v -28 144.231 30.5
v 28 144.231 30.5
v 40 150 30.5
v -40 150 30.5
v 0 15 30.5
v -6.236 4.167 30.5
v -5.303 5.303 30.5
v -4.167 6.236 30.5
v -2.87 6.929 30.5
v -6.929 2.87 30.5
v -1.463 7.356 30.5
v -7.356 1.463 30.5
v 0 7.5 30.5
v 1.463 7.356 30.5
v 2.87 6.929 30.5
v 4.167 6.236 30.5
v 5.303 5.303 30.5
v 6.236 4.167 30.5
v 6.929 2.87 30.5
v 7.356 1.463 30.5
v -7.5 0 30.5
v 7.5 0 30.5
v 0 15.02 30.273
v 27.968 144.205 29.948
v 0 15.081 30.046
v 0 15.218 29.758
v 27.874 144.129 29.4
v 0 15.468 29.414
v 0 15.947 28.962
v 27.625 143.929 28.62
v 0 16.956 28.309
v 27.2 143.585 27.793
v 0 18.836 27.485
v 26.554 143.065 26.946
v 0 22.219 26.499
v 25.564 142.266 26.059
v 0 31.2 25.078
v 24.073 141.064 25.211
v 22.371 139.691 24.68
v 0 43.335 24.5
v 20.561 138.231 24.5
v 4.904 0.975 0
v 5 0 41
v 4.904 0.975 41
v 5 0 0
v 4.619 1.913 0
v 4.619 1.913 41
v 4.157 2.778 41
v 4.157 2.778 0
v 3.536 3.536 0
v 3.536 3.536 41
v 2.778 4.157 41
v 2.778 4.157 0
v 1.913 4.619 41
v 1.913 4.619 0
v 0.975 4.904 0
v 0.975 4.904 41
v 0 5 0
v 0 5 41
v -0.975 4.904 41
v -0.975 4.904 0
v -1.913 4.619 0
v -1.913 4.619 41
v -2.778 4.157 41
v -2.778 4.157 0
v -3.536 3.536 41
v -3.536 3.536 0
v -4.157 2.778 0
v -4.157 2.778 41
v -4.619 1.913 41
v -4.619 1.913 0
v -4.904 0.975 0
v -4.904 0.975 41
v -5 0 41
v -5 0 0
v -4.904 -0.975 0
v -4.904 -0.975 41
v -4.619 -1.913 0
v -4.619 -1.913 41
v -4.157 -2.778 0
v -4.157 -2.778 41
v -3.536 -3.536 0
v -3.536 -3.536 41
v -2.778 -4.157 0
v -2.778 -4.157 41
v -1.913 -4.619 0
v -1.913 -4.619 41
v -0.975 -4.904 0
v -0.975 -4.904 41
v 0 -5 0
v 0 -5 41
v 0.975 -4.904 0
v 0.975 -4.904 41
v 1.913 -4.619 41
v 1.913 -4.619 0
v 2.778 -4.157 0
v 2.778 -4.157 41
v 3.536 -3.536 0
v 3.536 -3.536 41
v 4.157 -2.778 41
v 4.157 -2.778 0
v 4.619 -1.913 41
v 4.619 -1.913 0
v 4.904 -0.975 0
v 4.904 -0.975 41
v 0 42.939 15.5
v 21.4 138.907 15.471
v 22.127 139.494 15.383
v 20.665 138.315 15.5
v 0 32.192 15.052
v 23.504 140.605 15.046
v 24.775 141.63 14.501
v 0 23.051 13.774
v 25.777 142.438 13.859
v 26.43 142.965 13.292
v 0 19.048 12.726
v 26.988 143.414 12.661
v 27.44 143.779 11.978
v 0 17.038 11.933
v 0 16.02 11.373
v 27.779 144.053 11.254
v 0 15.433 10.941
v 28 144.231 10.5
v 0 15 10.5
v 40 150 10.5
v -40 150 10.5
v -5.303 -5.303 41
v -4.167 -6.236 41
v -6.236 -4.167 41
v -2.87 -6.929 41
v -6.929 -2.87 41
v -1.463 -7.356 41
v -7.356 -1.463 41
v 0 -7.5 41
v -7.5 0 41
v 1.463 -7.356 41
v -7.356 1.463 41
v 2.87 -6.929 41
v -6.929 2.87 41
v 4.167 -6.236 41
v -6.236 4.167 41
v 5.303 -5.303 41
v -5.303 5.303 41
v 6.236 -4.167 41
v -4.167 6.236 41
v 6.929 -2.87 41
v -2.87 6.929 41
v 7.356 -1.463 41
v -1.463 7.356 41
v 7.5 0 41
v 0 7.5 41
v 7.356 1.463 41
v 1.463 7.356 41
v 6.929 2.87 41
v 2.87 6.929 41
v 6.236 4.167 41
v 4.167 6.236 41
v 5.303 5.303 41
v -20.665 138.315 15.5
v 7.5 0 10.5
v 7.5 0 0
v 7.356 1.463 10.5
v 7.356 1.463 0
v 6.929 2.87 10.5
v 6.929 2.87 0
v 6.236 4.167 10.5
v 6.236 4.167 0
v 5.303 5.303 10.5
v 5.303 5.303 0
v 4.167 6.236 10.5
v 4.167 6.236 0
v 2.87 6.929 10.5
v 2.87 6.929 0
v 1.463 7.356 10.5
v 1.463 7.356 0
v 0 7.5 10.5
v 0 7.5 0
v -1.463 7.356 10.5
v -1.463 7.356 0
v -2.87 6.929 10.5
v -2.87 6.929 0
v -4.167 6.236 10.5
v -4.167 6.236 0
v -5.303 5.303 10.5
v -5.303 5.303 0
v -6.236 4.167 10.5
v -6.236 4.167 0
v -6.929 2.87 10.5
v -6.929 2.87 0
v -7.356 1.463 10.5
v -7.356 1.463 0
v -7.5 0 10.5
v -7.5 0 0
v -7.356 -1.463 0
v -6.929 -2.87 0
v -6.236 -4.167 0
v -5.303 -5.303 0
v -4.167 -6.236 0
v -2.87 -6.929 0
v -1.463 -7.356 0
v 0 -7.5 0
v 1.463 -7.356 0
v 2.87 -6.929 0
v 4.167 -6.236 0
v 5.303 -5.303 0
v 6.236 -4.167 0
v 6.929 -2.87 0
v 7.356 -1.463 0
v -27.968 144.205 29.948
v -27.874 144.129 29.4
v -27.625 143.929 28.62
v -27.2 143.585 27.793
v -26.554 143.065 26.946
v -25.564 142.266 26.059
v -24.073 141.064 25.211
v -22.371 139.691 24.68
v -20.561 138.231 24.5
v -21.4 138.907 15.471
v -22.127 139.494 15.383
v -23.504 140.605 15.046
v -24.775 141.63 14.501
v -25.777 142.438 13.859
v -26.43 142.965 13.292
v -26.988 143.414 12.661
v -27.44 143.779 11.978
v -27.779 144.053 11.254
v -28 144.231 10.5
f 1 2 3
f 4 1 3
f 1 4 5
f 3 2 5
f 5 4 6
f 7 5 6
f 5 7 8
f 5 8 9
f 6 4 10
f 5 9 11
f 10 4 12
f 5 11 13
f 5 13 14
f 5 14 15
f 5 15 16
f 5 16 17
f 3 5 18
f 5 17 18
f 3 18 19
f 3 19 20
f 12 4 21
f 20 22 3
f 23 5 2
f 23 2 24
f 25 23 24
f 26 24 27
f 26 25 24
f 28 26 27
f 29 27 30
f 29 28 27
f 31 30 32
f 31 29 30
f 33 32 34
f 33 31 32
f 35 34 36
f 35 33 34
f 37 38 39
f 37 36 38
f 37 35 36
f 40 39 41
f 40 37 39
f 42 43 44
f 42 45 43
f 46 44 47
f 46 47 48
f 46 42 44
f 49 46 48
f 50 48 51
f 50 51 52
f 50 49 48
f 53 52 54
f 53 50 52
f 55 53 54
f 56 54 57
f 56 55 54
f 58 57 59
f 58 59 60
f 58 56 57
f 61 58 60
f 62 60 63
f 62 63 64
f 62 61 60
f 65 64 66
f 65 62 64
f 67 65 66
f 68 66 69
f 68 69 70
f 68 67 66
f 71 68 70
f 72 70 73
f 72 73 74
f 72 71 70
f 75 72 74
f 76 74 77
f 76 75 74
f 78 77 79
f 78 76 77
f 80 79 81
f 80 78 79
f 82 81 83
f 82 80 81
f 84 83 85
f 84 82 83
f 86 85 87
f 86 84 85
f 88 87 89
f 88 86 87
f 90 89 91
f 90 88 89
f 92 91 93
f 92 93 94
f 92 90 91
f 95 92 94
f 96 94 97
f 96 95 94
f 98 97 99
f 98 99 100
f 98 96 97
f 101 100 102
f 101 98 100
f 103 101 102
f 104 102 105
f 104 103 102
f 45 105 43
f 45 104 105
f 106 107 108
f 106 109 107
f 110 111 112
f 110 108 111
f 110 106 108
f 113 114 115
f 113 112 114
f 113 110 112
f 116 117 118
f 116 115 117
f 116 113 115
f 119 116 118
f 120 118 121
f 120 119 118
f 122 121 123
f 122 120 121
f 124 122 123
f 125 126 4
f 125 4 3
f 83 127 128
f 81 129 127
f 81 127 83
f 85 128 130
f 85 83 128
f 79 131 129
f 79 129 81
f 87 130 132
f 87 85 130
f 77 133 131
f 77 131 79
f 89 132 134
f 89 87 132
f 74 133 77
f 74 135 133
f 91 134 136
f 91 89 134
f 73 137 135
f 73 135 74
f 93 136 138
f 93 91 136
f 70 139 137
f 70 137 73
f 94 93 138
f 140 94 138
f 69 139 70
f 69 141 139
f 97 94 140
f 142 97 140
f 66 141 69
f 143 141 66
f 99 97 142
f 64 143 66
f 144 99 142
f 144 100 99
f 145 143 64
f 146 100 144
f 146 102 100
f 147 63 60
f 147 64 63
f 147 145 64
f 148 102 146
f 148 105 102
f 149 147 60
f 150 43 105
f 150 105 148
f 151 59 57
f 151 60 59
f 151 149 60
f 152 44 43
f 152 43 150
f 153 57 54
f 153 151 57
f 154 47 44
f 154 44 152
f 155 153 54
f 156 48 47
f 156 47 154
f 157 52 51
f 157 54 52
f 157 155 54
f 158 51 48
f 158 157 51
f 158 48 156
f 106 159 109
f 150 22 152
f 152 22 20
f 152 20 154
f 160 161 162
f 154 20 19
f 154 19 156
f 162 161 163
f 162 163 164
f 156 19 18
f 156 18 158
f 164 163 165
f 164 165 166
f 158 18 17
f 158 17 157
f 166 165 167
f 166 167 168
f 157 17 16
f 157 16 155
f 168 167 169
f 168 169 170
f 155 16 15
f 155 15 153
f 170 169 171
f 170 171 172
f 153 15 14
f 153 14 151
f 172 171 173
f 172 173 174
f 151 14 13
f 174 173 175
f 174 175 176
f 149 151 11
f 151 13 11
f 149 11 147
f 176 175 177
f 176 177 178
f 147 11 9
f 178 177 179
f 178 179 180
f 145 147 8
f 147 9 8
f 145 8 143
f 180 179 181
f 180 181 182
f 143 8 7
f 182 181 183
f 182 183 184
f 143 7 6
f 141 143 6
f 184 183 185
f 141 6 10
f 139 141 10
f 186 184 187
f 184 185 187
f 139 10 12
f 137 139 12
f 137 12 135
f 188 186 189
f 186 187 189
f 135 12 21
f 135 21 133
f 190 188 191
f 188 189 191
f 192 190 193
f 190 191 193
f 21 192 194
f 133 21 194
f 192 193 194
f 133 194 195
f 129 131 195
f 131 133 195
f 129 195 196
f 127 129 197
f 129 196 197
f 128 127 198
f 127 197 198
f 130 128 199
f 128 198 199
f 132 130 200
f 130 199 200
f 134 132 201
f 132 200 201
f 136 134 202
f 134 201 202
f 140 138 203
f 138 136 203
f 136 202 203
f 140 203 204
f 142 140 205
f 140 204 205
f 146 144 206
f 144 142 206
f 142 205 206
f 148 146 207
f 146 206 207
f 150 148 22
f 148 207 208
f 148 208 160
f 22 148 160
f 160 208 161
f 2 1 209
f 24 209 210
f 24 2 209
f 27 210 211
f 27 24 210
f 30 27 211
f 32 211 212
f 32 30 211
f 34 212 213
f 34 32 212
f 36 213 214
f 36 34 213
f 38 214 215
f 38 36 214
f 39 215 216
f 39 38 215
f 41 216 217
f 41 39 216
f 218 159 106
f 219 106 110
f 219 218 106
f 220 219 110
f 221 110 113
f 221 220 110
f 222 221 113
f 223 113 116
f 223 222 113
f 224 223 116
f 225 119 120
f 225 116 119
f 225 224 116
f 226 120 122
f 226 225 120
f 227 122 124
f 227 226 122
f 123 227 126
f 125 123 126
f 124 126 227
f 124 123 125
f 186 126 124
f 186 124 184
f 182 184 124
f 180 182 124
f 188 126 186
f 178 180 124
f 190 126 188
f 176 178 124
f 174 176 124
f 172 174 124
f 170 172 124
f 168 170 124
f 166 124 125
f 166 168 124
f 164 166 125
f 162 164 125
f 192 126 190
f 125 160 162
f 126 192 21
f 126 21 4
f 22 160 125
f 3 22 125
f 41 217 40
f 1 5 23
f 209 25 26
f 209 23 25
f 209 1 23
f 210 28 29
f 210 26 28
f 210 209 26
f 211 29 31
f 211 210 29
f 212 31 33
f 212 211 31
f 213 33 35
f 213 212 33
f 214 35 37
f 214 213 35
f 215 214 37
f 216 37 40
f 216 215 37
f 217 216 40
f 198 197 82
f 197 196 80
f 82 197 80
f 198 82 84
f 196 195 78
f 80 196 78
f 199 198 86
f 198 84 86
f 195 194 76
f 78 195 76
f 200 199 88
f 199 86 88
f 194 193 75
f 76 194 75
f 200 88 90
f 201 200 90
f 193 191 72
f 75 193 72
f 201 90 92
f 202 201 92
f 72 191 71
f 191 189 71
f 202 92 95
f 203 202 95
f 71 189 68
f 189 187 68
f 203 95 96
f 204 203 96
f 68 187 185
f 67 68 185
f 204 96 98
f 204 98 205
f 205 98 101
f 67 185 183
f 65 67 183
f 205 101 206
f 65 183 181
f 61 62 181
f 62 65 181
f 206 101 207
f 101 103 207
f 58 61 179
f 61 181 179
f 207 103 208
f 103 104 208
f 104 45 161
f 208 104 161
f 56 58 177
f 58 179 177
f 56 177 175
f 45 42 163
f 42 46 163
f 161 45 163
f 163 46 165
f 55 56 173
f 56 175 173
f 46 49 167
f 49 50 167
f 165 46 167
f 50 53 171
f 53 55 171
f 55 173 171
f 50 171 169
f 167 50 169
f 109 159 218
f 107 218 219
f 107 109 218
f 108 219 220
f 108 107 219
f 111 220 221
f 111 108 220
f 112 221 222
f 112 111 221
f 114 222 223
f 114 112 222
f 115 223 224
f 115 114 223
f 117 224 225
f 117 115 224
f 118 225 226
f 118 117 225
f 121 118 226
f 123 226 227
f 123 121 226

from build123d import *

# Parameters (mm, degrees)
SKETCH1_R           = 7.5
SKETCH1_R_2         = 5
BOSS_EXTRUDE1_DEPTH = 41
SKETCH2_W           = 80
SKETCH2_H           = 20
BOSS_EXTRUDE2_DEPTH = 150
SKETCH3_R           = 5
CUT_EXTRUDE1_DEPTH  = 150
CUT_EXTRUDE2_DEPTH  = 150
CUT_EXTRUDE3_DEPTH  = 6
FILLET1_R           = 6


with BuildPart() as part:
    # Sketch1 → Boss-Extrude1 (new body)
    with BuildSketch(Plane.XY):
        Circle(SKETCH1_R)
        Circle(SKETCH1_R_2, mode=Mode.SUBTRACT)
    extrude(amount=BOSS_EXTRUDE1_DEPTH)

    # Sketch2 → Boss-Extrude2 (add)
    with BuildSketch(Plane(origin=(0, 0, 0), x_dir=(1, 0, 0), z_dir=(0, 1, 0))):
        with Locations((0, -20.5)):
            Rectangle(SKETCH2_W, SKETCH2_H)
    extrude(amount=BOSS_EXTRUDE2_DEPTH)

    # Sketch3 → Cut-Extrude1 (cut)
    with BuildSketch(Plane(origin=(0, 0, 0), x_dir=(-1, 0, 0), z_dir=(0, 0, -1))):
        with Locations(Location((0, 0, 0), (0, 0, 180))):
            Circle(SKETCH3_R)
    extrude(amount=-CUT_EXTRUDE1_DEPTH, mode=Mode.SUBTRACT)

    # Sketch4 → Cut-Extrude2 (cut)
    with BuildSketch(Plane(origin=(0, 0, 10.5), x_dir=(-1, 0, 0), z_dir=(0, 0, -1))):
        Polygon((7.5, 0), (40, 150), (40, 0), align=None)
    cut_extrude2 = extrude(amount=-CUT_EXTRUDE2_DEPTH, mode=Mode.SUBTRACT)

    # Mirror1: Cut-Extrude2 across plane
    add(cut_extrude2.mirror(Plane(origin=(0, 0, 0), x_dir=(0, 0, 1), z_dir=(1, 0, 0))), mode=Mode.SUBTRACT)

    # Sketch5 → Cut-Extrude3 (cut)
    with BuildSketch(Plane.XY.offset(30.5)):
        Polygon((-28, 144.230769231), (0, 15), (28, 144.230769231), align=None)
    cut_extrude3 = extrude(amount=-CUT_EXTRUDE3_DEPTH, mode=Mode.SUBTRACT)

    # Mirror2: Cut-Extrude3 across plane
    add(cut_extrude3.mirror(Plane.XY.offset(20)), mode=Mode.SUBTRACT)

    # Fillet1
    # the kernel refuses this fillet: 6 mm, written as the material it adds along each edge
    with BuildSketch(Plane(origin=(-3.176300205, 0.3401529, 24.5), x_dir=(0, 0, 1), z_dir=(0.21175334700580606, 0.9773231400267973, 0))) as fillet1_piece_1_section:
        with BuildLine():
            CenterArc((FILLET1_R, -FILLET1_R), FILLET1_R, 90, 90)
            Line((0, -FILLET1_R), (0, 0))
            Line((0, 0), (FILLET1_R, 0))
        make_face()
    fillet1_piece_1 = extrude(amount=162.229314889, mode=Mode.PRIVATE)
    fillet1_piece_1 = split(fillet1_piece_1, bisect_by=Plane(origin=(-13.111456884, 75.514416388, 25.854154081), z_dir=(0.9773231400267973, 0.21175334700580611, 0)), keep=Keep.TOP, mode=Mode.PRIVATE)
    fillet1_piece_1 = split(fillet1_piece_1, bisect_by=Plane(origin=(12.989714393, 144.230769231, 25.854154081), z_dir=(0, -1, 0)), keep=Keep.TOP, mode=Mode.PRIVATE)
    add(fillet1_piece_1)
    with BuildSketch(Plane(origin=(-31.176300205, 158.890616331, 24.5), x_dir=(0, 0, 1), z_dir=(0.21175334700580611, -0.9773231400267973, 0))) as fillet1_piece_2_section:
        with BuildLine():
            CenterArc((FILLET1_R, -FILLET1_R), FILLET1_R, 90, 90)
            Line((0, -FILLET1_R), (0, 0))
            Line((0, 0), (FILLET1_R, 0))
        make_face()
    fillet1_piece_2 = extrude(amount=162.229314889, mode=Mode.PRIVATE)
    fillet1_piece_2 = split(fillet1_piece_2, bisect_by=Plane(origin=(13.111456884, 75.514416388, 25.854154081), z_dir=(-0.9773231400267973, 0.21175334700580606, 0)), keep=Keep.TOP, mode=Mode.PRIVATE)
    fillet1_piece_2 = split(fillet1_piece_2, bisect_by=Plane(origin=(-12.989714393, 144.230769231, 25.854154081), z_dir=(0, -1, 0)), keep=Keep.TOP, mode=Mode.PRIVATE)
    add(fillet1_piece_2)
    with BuildSketch(Plane(origin=(43, 144.230769231, 24.5), x_dir=(0, 0, 1), z_dir=(-1, 0, 0))) as fillet1_piece_3_section:
        with BuildLine():
            CenterArc((FILLET1_R, -FILLET1_R), FILLET1_R, 90, 90)
            Line((0, -FILLET1_R), (0, 0))
            Line((0, 0), (FILLET1_R, 0))
        make_face()
    fillet1_piece_3 = extrude(amount=86, mode=Mode.PRIVATE)
    fillet1_piece_3 = split(fillet1_piece_3, bisect_by=Plane(origin=(-26.469184818, 137.165468391, 25.846029793), z_dir=(0.9773231400267973, 0.21175334700580611, 0)), keep=Keep.TOP, mode=Mode.PRIVATE)
    fillet1_piece_3 = split(fillet1_piece_3, bisect_by=Plane(origin=(26.469184818, 137.165468391, 25.846029793), z_dir=(-0.9773231400267973, 0.21175334700580606, 0)), keep=Keep.TOP, mode=Mode.PRIVATE)
    add(fillet1_piece_3)
    with BuildSketch(Plane(origin=(-3.131874238, 0.545195824, 15.5), x_dir=(0, 0, -1), z_dir=(0.21175334700580606, 0.9773231400267973, 0))) as fillet1_piece_4_section:
        with BuildLine():
            CenterArc((6, 5.916079783), FILLET1_R, 180, 80.405931773)
            Line((0, 5.916079783), (0, 0))
            Line((0, 0), (5, 0))
        make_face()
    fillet1_piece_4 = extrude(amount=161.809713804, mode=Mode.PRIVATE)
    fillet1_piece_4 = split(fillet1_piece_4, bisect_by=Plane(origin=(12.010804887, 144.230769231, 14.091740846), z_dir=(0, -1, 0)), keep=Keep.TOP, mode=Mode.PRIVATE)
    fillet1_piece_4 = split(fillet1_piece_4, bisect_by=Plane(origin=(-12.92288351, 74.644077737, 14.091740846), z_dir=(0.9773231400267973, 0.21175334700580611, 0)), keep=Keep.TOP, mode=Mode.PRIVATE)
    add(fillet1_piece_4)
    with BuildSketch(Plane(origin=(-31.131874238, 158.685573406, 15.5), x_dir=(0, 0, -1), z_dir=(0.21175334700580611, -0.9773231400267973, 0))) as fillet1_piece_5_section:
        with BuildLine():
            CenterArc((6, 5.916079783), FILLET1_R, 180, 80.405931773)
            Line((0, 5.916079783), (0, 0))
            Line((0, 0), (5, 0))
        make_face()
    fillet1_piece_5 = extrude(amount=161.809713804, mode=Mode.PRIVATE)
    fillet1_piece_5 = split(fillet1_piece_5, bisect_by=Plane(origin=(-12.010804887, 144.230769231, 14.091740846), z_dir=(0, -1, 0)), keep=Keep.TOP, mode=Mode.PRIVATE)
    fillet1_piece_5 = split(fillet1_piece_5, bisect_by=Plane(origin=(12.92288351, 74.644077737, 14.091740846), z_dir=(-0.9773231400267973, 0.21175334700580606, 0)), keep=Keep.TOP, mode=Mode.PRIVATE)
    add(fillet1_piece_5)
    with BuildSketch(Plane(origin=(42.790199458, 144.230769231, 15.5), x_dir=(0, 0, -1), z_dir=(-1, 0, 0))) as fillet1_piece_6_section:
        with BuildLine():
            CenterArc((6, 5.916079783), FILLET1_R, 180, 80.405931773)
            Line((0, 5.916079783), (0, 0))
            Line((0, 0), (5, 0))
        make_face()
    fillet1_piece_6 = extrude(amount=85.580398916, mode=Mode.PRIVATE)
    fillet1_piece_6 = split(fillet1_piece_6, bisect_by=Plane(origin=(26.323275838, 136.492042329, 14.091740846), z_dir=(-0.9773231400267973, 0.21175334700580606, 0)), keep=Keep.TOP, mode=Mode.PRIVATE)
    fillet1_piece_6 = split(fillet1_piece_6, bisect_by=Plane(origin=(-26.323275838, 136.492042329, 14.091740846), z_dir=(0.9773231400267973, 0.21175334700580611, 0)), keep=Keep.TOP, mode=Mode.PRIVATE)
    add(fillet1_piece_6)


solid = part.part
